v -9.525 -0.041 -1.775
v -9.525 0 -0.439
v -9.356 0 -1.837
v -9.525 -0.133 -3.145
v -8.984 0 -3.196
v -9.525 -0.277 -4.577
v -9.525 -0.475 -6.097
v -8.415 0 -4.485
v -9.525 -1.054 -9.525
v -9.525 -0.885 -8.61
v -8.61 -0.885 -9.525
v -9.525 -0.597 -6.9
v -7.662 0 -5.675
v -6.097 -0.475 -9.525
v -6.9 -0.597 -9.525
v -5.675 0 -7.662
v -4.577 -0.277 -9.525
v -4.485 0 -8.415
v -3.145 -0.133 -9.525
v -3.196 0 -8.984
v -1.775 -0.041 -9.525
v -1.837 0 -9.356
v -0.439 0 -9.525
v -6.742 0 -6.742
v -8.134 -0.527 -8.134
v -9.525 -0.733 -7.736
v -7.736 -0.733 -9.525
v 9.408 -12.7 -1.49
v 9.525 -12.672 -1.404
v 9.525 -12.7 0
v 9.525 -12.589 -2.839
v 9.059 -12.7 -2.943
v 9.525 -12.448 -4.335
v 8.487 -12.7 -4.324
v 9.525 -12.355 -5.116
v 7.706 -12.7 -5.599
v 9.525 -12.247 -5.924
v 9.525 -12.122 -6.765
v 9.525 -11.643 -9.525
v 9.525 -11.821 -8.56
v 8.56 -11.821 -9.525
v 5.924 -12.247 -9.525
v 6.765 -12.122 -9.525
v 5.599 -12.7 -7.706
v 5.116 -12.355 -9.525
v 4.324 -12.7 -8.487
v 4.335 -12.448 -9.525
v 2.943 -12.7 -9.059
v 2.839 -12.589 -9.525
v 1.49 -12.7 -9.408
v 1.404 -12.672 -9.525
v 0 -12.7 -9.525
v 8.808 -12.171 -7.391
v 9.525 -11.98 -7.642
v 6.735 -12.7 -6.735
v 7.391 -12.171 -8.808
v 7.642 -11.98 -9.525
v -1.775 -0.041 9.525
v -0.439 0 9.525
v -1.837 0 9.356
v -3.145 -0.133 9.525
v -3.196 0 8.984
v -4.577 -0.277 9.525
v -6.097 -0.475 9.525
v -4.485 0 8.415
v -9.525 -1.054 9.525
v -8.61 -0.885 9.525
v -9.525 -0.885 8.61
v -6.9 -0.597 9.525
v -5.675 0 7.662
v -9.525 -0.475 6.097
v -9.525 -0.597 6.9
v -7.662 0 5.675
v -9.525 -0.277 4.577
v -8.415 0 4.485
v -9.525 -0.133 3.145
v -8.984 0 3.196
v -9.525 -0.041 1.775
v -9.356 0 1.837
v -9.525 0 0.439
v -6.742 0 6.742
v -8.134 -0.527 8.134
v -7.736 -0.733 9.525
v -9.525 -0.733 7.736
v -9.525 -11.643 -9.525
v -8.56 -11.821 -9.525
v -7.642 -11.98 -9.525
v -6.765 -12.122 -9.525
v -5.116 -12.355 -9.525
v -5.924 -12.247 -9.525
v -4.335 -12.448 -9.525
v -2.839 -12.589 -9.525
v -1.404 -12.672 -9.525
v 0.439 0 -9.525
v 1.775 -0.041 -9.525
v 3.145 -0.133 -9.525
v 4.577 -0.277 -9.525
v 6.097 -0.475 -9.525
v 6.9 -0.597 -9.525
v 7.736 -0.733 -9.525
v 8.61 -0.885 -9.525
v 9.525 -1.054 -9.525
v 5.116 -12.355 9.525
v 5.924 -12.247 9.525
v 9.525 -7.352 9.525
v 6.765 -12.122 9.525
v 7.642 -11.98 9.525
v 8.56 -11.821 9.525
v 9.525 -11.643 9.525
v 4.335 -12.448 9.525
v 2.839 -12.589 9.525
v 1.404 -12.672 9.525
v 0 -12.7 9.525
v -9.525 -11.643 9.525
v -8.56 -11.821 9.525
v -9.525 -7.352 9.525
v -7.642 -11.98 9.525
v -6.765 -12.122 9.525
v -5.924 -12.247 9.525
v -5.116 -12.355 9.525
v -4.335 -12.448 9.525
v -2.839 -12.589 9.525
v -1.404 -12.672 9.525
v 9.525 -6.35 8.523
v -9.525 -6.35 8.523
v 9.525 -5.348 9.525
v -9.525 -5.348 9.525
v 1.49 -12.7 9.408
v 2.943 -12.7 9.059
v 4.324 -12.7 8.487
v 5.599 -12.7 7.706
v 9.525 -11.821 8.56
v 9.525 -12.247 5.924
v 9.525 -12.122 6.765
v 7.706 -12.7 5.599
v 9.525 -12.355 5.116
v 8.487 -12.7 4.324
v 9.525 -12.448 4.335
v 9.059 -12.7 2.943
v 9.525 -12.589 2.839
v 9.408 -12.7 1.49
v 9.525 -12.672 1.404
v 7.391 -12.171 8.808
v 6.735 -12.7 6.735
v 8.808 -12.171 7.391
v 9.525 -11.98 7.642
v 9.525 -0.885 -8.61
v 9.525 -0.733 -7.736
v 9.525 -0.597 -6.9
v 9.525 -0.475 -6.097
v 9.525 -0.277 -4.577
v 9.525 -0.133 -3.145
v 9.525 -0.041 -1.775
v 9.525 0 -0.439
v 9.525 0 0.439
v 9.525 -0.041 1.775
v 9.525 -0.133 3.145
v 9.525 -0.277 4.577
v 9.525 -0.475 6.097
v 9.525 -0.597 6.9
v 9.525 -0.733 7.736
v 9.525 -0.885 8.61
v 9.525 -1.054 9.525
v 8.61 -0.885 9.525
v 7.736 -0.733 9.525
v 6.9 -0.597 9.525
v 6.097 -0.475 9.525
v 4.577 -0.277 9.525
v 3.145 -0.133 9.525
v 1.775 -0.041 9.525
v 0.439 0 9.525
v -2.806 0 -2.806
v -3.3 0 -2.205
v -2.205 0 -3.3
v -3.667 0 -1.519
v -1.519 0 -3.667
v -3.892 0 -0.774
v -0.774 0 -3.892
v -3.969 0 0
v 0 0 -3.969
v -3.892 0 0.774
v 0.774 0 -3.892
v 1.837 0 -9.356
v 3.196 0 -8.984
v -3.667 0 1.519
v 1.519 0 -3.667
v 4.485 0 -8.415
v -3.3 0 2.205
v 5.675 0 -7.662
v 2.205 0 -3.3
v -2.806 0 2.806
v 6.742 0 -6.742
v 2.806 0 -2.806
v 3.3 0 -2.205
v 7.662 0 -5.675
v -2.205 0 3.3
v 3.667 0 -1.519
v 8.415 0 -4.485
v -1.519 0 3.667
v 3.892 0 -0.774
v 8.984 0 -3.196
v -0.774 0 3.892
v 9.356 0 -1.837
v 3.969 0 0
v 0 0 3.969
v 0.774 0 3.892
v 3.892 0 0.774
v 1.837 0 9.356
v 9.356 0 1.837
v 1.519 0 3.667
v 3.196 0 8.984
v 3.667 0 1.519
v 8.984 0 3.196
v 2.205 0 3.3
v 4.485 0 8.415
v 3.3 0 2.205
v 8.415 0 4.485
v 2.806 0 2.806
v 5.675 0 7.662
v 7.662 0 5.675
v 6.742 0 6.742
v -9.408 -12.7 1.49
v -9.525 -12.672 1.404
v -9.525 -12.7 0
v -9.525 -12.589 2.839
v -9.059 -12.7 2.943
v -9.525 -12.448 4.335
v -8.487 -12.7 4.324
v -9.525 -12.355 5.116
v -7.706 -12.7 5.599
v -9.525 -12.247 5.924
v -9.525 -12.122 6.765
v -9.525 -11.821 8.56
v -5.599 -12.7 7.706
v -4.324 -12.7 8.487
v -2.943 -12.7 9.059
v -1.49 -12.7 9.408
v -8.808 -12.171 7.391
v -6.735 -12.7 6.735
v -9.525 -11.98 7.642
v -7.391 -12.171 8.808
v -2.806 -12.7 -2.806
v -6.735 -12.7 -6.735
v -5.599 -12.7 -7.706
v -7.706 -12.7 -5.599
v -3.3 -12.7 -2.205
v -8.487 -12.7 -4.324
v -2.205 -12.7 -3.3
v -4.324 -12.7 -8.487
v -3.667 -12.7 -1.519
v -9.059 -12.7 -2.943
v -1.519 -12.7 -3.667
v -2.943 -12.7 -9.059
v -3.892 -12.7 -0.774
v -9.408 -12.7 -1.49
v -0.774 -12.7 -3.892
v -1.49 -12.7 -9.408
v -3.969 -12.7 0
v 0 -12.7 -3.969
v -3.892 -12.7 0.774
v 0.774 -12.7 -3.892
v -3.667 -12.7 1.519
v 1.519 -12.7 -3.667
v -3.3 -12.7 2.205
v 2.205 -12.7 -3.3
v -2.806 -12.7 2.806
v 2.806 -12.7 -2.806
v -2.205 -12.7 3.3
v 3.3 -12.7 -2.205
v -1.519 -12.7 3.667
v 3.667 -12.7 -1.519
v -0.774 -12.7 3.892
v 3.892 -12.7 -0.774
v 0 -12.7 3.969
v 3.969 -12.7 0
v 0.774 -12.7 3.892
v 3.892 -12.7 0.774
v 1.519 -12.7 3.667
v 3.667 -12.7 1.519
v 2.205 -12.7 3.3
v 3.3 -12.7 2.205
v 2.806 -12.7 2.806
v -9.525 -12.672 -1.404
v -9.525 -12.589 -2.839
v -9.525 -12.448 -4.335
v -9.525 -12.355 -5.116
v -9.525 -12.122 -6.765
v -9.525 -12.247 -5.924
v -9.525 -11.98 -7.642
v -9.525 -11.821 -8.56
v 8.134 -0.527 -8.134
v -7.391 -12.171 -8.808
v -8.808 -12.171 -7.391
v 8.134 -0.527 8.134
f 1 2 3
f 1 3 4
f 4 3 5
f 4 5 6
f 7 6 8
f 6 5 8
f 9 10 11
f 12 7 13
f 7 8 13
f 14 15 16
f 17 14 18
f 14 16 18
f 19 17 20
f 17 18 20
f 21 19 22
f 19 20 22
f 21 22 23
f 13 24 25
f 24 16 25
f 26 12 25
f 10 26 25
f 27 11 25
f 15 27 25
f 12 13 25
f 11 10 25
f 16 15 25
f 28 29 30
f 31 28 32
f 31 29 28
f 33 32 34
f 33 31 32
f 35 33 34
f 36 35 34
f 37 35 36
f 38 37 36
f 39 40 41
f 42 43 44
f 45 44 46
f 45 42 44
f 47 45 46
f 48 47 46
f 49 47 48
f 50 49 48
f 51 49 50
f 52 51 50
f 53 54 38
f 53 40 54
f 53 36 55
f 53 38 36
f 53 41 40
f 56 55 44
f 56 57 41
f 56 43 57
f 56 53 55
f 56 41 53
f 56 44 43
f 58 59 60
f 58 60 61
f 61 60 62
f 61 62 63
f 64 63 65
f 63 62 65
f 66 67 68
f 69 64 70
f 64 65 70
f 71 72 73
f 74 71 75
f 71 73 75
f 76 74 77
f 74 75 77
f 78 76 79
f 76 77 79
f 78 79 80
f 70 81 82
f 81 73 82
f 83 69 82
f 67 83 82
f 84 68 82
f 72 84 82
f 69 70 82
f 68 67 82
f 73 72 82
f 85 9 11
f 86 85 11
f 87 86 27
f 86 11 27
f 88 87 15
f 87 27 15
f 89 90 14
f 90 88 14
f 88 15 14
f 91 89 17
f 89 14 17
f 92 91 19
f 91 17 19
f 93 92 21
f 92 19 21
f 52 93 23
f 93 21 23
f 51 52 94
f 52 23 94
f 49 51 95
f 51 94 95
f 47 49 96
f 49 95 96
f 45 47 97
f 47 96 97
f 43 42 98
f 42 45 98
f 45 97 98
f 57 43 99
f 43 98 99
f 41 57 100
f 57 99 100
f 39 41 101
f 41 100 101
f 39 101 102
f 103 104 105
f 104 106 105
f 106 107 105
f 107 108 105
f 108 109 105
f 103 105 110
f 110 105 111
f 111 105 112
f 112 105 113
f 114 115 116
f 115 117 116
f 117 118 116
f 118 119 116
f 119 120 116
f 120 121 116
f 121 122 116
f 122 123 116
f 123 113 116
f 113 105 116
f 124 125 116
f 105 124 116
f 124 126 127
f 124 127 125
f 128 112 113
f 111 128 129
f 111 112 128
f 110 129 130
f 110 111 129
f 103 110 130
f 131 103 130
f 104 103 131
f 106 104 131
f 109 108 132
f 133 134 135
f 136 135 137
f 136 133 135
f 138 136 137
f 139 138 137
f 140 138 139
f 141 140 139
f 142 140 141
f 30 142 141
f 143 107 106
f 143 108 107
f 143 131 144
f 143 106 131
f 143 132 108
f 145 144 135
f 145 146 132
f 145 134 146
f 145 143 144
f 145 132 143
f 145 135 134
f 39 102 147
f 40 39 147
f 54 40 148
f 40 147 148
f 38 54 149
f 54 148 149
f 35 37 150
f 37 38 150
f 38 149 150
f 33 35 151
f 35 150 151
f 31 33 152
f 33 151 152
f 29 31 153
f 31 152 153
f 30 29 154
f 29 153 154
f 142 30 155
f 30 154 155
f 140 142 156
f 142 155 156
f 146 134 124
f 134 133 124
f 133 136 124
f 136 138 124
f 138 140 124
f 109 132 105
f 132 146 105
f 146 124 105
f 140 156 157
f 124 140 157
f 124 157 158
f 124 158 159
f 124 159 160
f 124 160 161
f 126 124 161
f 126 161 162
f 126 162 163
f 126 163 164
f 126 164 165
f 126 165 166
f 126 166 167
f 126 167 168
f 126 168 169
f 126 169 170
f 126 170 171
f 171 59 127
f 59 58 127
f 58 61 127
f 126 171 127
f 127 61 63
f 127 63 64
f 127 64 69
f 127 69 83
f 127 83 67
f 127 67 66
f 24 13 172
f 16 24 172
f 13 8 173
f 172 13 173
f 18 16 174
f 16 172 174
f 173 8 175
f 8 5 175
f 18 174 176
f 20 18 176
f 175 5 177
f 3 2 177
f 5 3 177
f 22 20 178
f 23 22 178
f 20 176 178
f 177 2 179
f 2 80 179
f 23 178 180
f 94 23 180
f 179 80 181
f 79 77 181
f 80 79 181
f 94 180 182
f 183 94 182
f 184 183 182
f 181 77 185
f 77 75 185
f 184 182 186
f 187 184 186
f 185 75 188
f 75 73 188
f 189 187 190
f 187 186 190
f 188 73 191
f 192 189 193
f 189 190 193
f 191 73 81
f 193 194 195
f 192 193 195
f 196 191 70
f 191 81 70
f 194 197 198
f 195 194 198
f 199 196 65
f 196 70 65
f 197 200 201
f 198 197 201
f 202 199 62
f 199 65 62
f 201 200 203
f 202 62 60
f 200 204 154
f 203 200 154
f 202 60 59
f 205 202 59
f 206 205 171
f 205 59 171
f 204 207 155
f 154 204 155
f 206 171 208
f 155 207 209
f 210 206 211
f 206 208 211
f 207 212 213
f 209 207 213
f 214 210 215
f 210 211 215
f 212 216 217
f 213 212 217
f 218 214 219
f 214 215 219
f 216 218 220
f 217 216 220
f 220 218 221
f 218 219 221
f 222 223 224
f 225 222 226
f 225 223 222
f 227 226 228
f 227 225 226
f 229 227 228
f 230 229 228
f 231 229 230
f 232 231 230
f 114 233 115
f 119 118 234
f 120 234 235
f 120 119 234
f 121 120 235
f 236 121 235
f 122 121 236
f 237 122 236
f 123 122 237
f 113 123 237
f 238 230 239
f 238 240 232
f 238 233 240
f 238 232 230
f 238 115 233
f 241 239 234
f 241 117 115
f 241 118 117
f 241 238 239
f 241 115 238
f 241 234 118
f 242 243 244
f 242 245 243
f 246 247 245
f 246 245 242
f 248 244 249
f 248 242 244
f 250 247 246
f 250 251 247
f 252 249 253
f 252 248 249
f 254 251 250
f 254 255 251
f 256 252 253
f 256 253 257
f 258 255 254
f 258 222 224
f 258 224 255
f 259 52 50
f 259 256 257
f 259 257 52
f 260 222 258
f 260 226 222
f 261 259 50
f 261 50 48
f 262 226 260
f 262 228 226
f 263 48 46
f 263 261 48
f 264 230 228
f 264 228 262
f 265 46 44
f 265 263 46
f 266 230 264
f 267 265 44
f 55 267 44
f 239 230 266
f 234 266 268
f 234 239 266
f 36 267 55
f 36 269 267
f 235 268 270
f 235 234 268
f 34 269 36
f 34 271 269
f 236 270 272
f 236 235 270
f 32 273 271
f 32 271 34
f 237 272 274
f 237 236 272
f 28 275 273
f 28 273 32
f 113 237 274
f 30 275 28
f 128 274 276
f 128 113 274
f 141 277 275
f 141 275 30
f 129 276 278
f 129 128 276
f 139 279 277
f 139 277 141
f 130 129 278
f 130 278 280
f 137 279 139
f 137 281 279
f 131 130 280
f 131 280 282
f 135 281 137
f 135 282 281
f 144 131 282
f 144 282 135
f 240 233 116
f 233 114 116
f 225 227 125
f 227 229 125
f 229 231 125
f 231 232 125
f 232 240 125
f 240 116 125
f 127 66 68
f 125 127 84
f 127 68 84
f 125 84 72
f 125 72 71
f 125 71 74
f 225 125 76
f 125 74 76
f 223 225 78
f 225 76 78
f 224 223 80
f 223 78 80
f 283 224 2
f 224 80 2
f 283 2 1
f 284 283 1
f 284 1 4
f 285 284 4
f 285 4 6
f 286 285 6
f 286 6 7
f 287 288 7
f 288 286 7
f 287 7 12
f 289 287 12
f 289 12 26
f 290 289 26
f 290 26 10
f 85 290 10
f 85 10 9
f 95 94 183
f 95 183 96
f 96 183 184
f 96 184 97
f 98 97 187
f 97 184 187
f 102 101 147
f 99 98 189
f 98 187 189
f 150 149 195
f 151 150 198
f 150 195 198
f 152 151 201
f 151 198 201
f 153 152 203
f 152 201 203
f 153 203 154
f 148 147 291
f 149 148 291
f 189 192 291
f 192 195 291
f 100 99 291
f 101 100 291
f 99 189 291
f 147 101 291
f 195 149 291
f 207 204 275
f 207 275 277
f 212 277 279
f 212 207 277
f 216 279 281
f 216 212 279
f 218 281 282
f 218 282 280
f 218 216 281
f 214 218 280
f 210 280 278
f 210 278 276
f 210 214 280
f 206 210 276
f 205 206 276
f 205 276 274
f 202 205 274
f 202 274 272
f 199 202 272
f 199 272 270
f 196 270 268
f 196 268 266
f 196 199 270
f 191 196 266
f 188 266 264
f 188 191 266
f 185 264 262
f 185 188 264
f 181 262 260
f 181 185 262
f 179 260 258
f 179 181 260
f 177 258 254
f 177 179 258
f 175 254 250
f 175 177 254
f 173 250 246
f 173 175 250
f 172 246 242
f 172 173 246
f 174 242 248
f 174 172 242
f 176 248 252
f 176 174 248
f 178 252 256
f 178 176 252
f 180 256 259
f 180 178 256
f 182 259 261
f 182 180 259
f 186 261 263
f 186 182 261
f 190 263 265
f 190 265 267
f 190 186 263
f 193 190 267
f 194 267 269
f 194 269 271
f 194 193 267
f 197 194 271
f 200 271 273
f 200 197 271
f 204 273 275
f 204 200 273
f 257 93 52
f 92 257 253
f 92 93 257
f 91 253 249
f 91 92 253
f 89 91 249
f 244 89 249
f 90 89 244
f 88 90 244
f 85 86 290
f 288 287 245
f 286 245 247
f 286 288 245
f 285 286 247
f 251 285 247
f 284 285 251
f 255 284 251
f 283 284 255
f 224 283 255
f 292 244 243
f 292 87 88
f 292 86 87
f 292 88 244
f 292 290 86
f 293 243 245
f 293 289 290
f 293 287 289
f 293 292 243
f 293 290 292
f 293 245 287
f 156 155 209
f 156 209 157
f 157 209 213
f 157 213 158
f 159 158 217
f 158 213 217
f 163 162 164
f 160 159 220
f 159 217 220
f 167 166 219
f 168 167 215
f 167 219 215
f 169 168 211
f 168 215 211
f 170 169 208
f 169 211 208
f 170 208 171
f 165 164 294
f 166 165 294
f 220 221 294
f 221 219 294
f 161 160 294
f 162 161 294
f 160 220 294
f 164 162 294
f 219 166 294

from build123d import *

# Parameters (mm, degrees)
F0_R     = 3.96875
F1_DEPTH = 12.7
F5_DEPTH = 127


with BuildPart() as f1:
    # F0 (on Front) → F1 (new body)
    with BuildSketch(Plane.XZ):
        with BuildLine():
            ThreePointArc((0, -9.525), (6.7351920908, -6.7351920908), (9.525, 0))
            ThreePointArc((9.525, 0), (6.7351920908, 6.7351920908), (0, 9.525))
            ThreePointArc((0, 9.525), (-6.7351920908, 6.7351920908), (-9.525, 0))
            ThreePointArc((-9.525, 0), (-6.7351920908, -6.7351920908), (0, -9.525))
        make_face()
        Circle(F0_R, mode=Mode.SUBTRACT)
        with BuildLine():
            Line((9.525, -9.525), (9.525, 0))
            ThreePointArc((9.525, 0), (6.7351920908, -6.7351920908), (0, -9.525))
            Line((0, -9.525), (9.525, -9.525))
        make_face()
        with BuildLine():
            ThreePointArc((0, 9.525), (6.7351920908, 6.7351920908), (9.525, 0))
            Line((9.525, 0), (9.525, 9.525))
            Line((9.525, 9.525), (0, 9.525))
        make_face()
        with BuildLine():
            ThreePointArc((-9.525, 0), (-6.7351920908, 6.7351920908), (0, 9.525))
            Line((0, 9.525), (-9.525, 9.525))
            Line((-9.525, 9.525), (-9.525, 0))
        make_face()
        with BuildLine():
            Line((-9.525, -9.525), (0, -9.525))
            ThreePointArc((0, -9.525), (-6.7351920908, -6.7351920908), (-9.525, 0))
            Line((-9.525, 0), (-9.525, -9.525))
        make_face()
    extrude(amount=F1_DEPTH)

    # F4 (on face) → F5 (cut)
    with BuildSketch(Plane(origin=(-9.525, 0, 0), x_dir=(0, -1, 0), z_dir=(-1, 0, 0))):
        Polygon((3.6136890898, 11.2591073548), (6.35, 8.5227964446), (9.0863109102, 11.2591073548), align=None)
    extrude(amount=-F5_DEPTH, mode=Mode.SUBTRACT)

    # F6 (on face) → F7 (revolve, cut)
    with BuildSketch(Plane.YZ):
        Polygon((-12.7, 15.6255830079), (-12.7, 9.525), (-11.0653537097, 15.6255830079), align=None)
    revolve(axis=Axis((0, 0, 0), (0, 1, 0)), mode=Mode.SUBTRACT)

    # F8 (on face) → F9 (revolve, cut)
    with BuildSketch(Plane.YZ):
        Polygon((-1.1722899654, 13.910143229), (0, 9.5350975171), (0, 13.910143229), align=None)
    revolve(axis=Axis((0, 0, 0), (0, -1, 0)), mode=Mode.SUBTRACT)


solid = f1.part
